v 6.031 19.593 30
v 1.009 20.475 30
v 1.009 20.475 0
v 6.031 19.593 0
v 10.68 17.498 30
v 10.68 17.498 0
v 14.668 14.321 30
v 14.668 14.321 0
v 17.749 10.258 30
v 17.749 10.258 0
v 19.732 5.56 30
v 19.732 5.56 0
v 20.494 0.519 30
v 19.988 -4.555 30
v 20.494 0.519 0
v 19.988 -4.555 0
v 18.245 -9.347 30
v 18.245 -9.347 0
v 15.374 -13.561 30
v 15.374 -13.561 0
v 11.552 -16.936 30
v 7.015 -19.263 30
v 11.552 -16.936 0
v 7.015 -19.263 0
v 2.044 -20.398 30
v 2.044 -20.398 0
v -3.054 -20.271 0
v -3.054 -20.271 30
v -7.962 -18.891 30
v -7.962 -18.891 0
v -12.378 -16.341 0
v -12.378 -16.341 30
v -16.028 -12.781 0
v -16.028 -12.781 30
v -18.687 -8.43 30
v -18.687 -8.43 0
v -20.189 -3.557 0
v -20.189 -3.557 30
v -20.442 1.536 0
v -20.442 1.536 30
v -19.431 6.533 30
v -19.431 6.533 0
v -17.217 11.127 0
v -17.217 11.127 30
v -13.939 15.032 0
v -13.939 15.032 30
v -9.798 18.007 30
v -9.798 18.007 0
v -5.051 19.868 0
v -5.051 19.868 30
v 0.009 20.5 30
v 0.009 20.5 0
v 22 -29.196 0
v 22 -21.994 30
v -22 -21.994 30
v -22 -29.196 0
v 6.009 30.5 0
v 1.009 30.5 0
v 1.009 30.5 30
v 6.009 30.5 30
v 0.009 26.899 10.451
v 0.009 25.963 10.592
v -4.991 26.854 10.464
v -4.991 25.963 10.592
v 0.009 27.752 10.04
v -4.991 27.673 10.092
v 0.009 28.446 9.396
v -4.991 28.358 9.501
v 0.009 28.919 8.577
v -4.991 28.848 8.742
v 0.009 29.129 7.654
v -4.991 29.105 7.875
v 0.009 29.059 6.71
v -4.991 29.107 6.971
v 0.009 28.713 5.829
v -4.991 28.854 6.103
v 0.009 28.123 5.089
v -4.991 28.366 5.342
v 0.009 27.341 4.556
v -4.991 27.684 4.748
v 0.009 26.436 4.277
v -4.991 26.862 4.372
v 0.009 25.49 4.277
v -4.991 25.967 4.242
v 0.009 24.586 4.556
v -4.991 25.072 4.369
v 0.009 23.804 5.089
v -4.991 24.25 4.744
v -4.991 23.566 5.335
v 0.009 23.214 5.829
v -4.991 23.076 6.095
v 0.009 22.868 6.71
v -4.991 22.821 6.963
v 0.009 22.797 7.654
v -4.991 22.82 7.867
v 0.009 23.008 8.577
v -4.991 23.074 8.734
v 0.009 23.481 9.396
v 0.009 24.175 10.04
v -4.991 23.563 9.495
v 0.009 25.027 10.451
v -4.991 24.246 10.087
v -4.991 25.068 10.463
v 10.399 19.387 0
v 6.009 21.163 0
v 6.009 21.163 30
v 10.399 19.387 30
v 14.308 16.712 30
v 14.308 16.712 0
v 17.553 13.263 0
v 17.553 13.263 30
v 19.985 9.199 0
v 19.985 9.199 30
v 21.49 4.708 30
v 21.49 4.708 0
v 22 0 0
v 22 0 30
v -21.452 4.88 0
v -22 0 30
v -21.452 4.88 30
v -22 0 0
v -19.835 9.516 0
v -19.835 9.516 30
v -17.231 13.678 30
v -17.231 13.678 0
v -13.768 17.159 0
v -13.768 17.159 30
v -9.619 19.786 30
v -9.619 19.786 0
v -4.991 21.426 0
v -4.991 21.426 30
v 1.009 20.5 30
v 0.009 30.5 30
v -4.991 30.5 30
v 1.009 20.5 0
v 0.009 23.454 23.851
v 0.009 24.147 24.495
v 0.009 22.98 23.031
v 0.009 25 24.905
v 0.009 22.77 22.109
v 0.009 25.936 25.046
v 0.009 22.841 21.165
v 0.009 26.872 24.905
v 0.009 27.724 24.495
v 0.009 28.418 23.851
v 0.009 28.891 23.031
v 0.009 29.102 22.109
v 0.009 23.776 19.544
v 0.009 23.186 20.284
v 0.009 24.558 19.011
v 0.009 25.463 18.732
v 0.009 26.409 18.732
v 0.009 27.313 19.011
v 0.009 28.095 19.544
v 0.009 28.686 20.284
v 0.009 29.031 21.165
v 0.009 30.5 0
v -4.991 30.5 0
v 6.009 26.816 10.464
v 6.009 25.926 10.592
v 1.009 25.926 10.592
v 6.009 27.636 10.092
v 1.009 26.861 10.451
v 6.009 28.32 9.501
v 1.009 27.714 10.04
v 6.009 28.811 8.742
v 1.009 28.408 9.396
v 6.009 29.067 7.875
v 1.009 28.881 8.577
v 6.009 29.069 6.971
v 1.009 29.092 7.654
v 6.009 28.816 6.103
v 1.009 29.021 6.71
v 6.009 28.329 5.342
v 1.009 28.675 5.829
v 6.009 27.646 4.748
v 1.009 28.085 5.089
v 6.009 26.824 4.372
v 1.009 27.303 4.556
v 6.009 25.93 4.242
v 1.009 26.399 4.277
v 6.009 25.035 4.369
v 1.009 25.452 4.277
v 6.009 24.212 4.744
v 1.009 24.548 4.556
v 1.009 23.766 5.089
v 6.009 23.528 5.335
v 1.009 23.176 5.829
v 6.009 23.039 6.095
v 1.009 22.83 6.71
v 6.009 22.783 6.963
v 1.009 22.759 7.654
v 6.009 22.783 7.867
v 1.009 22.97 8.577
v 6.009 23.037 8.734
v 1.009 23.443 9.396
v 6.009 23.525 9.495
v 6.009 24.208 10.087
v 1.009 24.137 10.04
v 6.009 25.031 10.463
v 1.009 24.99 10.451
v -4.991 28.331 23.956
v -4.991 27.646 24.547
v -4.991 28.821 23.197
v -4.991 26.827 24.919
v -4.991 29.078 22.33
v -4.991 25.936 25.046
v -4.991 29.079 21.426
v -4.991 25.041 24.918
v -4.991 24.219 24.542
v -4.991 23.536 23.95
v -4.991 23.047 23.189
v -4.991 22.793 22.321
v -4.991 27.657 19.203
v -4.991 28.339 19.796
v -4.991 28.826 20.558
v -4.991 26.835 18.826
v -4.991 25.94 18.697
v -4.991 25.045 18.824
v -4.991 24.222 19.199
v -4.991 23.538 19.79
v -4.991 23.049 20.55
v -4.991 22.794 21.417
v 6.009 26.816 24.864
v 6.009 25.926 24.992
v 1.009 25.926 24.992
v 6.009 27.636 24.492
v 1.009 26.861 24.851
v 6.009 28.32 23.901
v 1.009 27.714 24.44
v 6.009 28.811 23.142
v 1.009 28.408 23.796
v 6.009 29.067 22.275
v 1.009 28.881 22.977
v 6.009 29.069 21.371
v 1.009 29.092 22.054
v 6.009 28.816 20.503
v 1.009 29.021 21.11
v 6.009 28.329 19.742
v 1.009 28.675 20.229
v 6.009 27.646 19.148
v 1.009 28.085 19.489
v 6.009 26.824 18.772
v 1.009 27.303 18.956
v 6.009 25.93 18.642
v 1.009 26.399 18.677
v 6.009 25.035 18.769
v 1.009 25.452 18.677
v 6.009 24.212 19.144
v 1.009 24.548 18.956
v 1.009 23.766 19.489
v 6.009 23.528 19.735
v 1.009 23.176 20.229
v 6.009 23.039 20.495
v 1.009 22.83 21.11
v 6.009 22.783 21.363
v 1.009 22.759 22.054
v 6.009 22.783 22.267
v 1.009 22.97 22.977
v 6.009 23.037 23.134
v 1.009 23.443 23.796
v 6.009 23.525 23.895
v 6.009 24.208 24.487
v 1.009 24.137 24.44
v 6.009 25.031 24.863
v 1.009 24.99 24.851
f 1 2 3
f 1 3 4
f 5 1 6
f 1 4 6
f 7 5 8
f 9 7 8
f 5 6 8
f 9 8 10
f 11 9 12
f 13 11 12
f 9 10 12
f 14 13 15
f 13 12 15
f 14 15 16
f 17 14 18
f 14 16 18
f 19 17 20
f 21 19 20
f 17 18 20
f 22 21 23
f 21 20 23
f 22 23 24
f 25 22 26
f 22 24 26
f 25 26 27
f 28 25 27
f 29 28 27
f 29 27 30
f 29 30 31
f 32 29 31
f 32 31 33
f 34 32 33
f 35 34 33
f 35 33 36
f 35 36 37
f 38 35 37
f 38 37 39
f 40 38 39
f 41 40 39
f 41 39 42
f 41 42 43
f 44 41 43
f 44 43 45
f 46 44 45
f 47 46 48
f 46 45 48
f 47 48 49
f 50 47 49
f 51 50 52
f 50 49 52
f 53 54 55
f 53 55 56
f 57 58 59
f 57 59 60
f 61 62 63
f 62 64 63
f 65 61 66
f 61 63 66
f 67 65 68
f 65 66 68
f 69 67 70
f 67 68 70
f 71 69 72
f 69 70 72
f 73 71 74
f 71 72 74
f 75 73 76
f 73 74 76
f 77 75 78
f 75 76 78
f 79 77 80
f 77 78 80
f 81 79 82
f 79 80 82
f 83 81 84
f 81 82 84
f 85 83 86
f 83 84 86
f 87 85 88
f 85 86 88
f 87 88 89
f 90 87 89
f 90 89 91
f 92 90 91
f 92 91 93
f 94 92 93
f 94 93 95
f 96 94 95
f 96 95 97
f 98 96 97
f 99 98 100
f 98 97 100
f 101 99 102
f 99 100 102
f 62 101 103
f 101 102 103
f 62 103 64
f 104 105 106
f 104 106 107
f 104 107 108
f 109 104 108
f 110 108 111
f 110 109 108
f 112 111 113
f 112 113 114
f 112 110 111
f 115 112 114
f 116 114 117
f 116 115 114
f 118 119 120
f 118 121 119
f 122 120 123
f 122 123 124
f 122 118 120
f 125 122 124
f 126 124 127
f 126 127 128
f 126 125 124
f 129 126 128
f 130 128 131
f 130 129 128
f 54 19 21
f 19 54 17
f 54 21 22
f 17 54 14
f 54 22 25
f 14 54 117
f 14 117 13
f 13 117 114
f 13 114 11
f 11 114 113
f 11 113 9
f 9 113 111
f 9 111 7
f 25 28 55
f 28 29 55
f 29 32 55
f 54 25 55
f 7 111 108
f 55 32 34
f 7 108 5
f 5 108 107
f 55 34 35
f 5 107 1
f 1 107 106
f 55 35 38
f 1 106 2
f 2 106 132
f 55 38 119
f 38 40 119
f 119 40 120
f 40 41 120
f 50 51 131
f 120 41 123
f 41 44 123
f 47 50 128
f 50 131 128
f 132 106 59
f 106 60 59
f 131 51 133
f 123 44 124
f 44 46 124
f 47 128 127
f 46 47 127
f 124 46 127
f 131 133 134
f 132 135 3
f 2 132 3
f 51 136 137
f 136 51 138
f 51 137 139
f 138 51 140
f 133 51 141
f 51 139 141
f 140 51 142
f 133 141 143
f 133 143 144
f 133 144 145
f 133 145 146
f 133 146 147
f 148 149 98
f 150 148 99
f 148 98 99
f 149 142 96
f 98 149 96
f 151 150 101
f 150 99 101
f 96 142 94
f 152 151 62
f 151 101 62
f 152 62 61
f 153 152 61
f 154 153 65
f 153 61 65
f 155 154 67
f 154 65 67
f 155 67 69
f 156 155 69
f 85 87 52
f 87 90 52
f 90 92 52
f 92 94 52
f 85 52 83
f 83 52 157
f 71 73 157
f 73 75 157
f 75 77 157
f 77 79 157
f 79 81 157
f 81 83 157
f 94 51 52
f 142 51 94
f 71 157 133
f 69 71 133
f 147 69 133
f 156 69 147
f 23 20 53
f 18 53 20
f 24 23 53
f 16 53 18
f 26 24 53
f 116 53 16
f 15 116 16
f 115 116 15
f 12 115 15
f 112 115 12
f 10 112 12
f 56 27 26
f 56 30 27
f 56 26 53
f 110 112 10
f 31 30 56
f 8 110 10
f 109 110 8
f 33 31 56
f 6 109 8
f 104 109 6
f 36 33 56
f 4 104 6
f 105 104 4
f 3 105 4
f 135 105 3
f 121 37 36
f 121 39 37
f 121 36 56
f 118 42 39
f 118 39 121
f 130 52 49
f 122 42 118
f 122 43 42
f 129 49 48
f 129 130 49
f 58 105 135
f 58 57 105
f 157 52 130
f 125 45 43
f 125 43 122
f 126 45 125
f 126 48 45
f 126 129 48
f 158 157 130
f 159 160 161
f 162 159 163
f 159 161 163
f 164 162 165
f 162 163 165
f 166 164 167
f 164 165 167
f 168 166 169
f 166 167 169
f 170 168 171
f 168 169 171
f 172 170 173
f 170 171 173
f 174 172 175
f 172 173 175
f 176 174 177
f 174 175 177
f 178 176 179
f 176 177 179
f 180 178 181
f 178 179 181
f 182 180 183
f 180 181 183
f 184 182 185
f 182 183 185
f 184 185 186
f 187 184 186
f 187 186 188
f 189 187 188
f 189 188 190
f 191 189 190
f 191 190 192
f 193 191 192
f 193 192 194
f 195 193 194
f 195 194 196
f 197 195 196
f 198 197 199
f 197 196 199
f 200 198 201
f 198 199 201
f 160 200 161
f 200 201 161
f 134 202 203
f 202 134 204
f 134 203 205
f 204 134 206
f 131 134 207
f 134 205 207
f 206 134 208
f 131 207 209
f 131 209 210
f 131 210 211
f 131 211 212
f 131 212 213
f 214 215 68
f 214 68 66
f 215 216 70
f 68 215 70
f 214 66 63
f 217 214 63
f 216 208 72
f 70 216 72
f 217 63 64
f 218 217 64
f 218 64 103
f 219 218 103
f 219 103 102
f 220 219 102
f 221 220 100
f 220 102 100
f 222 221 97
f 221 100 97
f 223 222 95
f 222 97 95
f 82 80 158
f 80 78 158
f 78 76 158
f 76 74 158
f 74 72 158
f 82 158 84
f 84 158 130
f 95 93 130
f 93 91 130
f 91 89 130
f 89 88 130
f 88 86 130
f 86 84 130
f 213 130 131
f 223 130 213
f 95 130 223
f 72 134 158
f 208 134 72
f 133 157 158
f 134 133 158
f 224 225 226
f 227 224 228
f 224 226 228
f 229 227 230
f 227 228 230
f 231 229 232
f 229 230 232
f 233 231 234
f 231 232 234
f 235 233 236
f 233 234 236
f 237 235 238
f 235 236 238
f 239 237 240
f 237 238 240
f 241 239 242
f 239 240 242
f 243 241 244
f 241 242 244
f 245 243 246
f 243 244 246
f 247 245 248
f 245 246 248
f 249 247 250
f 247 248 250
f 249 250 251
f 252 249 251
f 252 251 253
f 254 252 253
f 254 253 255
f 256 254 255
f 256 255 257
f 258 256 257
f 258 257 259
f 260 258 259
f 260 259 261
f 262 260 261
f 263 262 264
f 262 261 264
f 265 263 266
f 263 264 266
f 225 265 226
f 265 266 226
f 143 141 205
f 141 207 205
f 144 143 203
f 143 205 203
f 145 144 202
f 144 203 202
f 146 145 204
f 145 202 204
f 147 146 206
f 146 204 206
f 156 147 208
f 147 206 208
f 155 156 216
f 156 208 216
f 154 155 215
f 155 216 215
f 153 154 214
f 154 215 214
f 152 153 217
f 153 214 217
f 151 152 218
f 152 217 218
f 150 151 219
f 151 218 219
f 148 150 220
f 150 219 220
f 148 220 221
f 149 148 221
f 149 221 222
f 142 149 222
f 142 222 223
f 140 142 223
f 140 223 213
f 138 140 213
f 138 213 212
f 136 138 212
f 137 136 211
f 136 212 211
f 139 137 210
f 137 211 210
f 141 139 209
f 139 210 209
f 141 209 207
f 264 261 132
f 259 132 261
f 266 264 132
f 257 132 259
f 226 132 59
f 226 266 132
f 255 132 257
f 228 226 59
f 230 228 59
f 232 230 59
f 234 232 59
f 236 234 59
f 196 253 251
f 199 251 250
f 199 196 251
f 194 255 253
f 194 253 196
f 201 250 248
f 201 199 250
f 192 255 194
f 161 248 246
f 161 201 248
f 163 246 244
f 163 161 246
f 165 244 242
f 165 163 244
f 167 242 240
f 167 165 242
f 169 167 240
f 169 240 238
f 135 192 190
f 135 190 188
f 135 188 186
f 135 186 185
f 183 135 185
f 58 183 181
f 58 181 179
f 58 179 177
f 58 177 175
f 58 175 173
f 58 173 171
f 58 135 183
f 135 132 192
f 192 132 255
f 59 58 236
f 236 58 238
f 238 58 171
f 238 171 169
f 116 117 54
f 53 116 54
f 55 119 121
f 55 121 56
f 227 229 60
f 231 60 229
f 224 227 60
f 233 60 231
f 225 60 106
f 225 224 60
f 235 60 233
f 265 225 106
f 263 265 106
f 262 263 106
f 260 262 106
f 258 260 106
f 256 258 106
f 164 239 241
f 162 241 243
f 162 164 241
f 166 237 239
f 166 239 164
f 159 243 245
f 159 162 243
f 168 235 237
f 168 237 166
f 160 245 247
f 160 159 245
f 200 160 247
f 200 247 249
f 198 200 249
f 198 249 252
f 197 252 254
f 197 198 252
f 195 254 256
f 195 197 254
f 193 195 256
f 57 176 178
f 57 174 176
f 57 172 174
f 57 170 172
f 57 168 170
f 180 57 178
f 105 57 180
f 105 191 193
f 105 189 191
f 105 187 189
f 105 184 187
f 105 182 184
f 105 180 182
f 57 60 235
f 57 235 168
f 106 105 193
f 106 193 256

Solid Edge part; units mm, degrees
sketch "Sketch1" plane through (0, 0, 0) normal (0, 0, 1) x (1, 0, 0)
  line L0 (6.0091, 30.5) -> (6.0091, 21.1635)
  line L1 (22.0001, 0) -> (22.0001, -21.9937)
  line L2 (-0.5256, -21.9937) -> (22.0001, -21.9937)
  line L3 (-0.5256, -21.9937) -> (-21.9999, -21.9937)
  line L4 (-21.9999, 0) -> (-21.9999, -21.9937)
  arc A0 (-21.9999, 0) -> (-4.9909, 21.4264) centre (0.0001, 0) cw
  line L5 (-4.9909, 30.5) -> (-4.9909, 21.4264)
  line L6 (0.0091, 30.5) -> (-4.9909, 30.5)
  line L7 (0.0091, 20.5) -> (0.0091, 30.5)
  line L8 (1.0091, 20.5) -> (1.0091, 20.4752)
  line L9 (1.0091, 20.5) -> (1.0091, 30.5)
  line L10 (1.0091, 30.5) -> (6.0091, 30.5)
  arc A1 (6.0091, 21.1635) -> (22.0001, 0) centre (0.0001, 0) cw
  arc A2 (1.0091, 20.4752) -> (0.0091, 20.5) centre (0.0001, 0) cw
extrude "Protrusion1" add sketch "Sketch1" along normal blind 30
hole "Hole_1" at (-4.9909, 25.9632, 7.4167) direction (1, 0, 0) diameter 6.35 end up to next
hole "Hole1" at (-4.9909, 25.9359, 21.8715) direction (1, 0, 0) diameter 6.35 end up to next
hole "Hole_3" at (1.0091, 25.9256, 7.4167) direction (1, 0, 0) diameter 6.35 end up to next
hole "Hole2" at (1.0091, 25.9256, 21.8167) direction (1, 0, 0) diameter 6.35 end up to next
sketch "Sketch2" plane through (22.0001, -10.9968, 15) normal (1, 0, 0) x (0, 1, 0)
  line L0 (-10.9968, 15) -> (-10.9968, -15)
  line L1 (-10.9968, -15) -> (-18.1991, -15)
  line L2 (-10.9968, 15) -> (-18.1991, -15)
extrude "ExtrudedProtrusion_2" add sketch "Sketch2" against normal blind 44
